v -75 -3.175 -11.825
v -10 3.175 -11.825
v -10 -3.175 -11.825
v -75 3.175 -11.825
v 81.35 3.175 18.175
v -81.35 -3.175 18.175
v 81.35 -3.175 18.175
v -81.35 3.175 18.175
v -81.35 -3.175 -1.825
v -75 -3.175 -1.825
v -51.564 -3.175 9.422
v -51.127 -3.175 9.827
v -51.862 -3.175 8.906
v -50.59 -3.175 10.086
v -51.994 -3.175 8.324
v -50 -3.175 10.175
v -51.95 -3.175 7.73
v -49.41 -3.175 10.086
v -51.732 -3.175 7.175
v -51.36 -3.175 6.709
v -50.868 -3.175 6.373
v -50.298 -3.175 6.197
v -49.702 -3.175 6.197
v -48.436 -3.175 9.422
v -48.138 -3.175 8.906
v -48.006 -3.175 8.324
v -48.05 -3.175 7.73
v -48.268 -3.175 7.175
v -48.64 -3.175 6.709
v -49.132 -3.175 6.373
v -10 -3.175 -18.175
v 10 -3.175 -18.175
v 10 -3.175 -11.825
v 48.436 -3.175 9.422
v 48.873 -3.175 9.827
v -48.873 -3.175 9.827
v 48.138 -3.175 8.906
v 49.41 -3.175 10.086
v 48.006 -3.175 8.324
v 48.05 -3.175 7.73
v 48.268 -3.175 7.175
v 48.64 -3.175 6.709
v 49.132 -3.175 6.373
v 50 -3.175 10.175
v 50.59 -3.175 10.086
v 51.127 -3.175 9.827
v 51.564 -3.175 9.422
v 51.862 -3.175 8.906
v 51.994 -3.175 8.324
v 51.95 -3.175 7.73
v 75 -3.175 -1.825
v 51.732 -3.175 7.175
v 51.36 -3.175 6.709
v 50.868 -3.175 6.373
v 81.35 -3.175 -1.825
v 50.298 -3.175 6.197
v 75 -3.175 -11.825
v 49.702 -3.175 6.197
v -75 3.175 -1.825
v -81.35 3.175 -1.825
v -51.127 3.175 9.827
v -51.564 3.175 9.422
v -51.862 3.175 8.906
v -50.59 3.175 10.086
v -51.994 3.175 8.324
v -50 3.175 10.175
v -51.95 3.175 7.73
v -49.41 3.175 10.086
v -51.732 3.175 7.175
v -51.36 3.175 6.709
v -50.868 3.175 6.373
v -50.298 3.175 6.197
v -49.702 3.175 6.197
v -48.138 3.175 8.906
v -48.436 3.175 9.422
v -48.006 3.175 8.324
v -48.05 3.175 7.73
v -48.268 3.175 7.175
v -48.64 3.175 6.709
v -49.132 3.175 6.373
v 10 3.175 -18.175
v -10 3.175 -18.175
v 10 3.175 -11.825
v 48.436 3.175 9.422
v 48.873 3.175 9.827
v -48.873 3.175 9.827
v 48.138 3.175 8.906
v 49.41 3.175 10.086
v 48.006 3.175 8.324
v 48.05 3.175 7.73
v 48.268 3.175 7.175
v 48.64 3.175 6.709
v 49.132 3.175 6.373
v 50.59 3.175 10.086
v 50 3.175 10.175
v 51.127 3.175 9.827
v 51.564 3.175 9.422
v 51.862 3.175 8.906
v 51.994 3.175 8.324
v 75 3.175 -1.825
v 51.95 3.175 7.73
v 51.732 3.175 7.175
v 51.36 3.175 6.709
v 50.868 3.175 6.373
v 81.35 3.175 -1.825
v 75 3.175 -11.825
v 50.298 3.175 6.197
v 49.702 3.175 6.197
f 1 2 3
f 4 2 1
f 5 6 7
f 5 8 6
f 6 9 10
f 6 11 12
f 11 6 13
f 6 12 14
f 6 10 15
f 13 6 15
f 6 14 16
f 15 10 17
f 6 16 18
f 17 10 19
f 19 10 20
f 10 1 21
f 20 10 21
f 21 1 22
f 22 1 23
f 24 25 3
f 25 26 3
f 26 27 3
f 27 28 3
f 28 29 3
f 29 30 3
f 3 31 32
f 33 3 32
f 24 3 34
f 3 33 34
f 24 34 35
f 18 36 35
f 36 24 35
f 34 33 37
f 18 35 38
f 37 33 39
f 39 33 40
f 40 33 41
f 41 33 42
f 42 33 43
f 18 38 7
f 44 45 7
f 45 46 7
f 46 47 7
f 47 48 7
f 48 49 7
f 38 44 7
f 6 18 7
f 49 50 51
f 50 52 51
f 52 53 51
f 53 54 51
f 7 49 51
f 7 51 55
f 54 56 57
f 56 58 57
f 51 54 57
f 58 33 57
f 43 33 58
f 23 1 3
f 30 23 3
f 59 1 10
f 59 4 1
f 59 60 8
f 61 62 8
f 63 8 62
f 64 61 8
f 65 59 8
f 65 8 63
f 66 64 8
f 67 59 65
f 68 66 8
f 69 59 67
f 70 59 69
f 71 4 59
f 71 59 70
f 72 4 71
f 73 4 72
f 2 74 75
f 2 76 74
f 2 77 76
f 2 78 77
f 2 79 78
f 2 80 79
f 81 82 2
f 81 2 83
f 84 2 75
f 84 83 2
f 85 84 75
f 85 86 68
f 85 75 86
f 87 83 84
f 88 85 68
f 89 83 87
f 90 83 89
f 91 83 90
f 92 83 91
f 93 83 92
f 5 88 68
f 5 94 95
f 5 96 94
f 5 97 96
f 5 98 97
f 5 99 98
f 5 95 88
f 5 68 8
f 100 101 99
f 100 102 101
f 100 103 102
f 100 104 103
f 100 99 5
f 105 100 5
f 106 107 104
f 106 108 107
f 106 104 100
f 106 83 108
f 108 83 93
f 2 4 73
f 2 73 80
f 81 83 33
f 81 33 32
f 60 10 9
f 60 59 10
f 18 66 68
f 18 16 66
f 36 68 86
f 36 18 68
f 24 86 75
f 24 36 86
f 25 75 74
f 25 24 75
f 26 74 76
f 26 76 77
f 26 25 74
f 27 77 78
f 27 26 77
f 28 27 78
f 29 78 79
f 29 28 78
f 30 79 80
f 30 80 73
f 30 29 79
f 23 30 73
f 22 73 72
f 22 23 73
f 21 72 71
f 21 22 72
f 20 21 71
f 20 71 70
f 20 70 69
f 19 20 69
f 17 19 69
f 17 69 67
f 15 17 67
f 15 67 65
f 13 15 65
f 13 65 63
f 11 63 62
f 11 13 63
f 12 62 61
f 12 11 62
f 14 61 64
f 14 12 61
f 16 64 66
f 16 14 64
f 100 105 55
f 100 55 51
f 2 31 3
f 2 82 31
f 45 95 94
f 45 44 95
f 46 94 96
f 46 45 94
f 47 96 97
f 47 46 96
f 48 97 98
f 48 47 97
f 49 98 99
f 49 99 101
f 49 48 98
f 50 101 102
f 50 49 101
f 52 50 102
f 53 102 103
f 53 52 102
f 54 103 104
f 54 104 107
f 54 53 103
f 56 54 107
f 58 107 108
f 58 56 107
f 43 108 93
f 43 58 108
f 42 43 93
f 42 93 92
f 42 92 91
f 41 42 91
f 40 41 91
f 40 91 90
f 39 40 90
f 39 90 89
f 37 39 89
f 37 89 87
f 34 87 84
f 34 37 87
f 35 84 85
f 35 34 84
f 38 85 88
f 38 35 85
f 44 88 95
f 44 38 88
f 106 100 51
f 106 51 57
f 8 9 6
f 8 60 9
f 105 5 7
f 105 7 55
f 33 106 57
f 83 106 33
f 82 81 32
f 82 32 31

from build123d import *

# Parameters (mm, degrees)
SKETCH1_R           = 2
BOSS_EXTRUDE1_DEPTH = 3.175


with BuildPart() as part:
    # Sketch1 → Boss-Extrude1 (new, symmetric)
    with BuildSketch(Plane(origin=(0, 0, 0), x_dir=(1, 0, 0), z_dir=(0, 1, 0))):
        Polygon((-81.35, -18.175), (81.35, -18.175), (81.35, 1.825), (75, 1.825), (75, 11.825), (10, 11.825), (10, 18.175), (-10, 18.175), (-10, 11.825), (-75, 11.825), (-75, 1.825), (-81.35, 1.825), align=None)
        with Locations(Location((-50, -8.175, 0), (0, 0, 270))):
            Circle(SKETCH1_R, mode=Mode.SUBTRACT)
        with Locations(Location((50, -8.175, 0), (0, 0, 270))):
            Circle(SKETCH1_R, mode=Mode.SUBTRACT)
    extrude(amount=BOSS_EXTRUDE1_DEPTH, both=True)


solid = part.part
